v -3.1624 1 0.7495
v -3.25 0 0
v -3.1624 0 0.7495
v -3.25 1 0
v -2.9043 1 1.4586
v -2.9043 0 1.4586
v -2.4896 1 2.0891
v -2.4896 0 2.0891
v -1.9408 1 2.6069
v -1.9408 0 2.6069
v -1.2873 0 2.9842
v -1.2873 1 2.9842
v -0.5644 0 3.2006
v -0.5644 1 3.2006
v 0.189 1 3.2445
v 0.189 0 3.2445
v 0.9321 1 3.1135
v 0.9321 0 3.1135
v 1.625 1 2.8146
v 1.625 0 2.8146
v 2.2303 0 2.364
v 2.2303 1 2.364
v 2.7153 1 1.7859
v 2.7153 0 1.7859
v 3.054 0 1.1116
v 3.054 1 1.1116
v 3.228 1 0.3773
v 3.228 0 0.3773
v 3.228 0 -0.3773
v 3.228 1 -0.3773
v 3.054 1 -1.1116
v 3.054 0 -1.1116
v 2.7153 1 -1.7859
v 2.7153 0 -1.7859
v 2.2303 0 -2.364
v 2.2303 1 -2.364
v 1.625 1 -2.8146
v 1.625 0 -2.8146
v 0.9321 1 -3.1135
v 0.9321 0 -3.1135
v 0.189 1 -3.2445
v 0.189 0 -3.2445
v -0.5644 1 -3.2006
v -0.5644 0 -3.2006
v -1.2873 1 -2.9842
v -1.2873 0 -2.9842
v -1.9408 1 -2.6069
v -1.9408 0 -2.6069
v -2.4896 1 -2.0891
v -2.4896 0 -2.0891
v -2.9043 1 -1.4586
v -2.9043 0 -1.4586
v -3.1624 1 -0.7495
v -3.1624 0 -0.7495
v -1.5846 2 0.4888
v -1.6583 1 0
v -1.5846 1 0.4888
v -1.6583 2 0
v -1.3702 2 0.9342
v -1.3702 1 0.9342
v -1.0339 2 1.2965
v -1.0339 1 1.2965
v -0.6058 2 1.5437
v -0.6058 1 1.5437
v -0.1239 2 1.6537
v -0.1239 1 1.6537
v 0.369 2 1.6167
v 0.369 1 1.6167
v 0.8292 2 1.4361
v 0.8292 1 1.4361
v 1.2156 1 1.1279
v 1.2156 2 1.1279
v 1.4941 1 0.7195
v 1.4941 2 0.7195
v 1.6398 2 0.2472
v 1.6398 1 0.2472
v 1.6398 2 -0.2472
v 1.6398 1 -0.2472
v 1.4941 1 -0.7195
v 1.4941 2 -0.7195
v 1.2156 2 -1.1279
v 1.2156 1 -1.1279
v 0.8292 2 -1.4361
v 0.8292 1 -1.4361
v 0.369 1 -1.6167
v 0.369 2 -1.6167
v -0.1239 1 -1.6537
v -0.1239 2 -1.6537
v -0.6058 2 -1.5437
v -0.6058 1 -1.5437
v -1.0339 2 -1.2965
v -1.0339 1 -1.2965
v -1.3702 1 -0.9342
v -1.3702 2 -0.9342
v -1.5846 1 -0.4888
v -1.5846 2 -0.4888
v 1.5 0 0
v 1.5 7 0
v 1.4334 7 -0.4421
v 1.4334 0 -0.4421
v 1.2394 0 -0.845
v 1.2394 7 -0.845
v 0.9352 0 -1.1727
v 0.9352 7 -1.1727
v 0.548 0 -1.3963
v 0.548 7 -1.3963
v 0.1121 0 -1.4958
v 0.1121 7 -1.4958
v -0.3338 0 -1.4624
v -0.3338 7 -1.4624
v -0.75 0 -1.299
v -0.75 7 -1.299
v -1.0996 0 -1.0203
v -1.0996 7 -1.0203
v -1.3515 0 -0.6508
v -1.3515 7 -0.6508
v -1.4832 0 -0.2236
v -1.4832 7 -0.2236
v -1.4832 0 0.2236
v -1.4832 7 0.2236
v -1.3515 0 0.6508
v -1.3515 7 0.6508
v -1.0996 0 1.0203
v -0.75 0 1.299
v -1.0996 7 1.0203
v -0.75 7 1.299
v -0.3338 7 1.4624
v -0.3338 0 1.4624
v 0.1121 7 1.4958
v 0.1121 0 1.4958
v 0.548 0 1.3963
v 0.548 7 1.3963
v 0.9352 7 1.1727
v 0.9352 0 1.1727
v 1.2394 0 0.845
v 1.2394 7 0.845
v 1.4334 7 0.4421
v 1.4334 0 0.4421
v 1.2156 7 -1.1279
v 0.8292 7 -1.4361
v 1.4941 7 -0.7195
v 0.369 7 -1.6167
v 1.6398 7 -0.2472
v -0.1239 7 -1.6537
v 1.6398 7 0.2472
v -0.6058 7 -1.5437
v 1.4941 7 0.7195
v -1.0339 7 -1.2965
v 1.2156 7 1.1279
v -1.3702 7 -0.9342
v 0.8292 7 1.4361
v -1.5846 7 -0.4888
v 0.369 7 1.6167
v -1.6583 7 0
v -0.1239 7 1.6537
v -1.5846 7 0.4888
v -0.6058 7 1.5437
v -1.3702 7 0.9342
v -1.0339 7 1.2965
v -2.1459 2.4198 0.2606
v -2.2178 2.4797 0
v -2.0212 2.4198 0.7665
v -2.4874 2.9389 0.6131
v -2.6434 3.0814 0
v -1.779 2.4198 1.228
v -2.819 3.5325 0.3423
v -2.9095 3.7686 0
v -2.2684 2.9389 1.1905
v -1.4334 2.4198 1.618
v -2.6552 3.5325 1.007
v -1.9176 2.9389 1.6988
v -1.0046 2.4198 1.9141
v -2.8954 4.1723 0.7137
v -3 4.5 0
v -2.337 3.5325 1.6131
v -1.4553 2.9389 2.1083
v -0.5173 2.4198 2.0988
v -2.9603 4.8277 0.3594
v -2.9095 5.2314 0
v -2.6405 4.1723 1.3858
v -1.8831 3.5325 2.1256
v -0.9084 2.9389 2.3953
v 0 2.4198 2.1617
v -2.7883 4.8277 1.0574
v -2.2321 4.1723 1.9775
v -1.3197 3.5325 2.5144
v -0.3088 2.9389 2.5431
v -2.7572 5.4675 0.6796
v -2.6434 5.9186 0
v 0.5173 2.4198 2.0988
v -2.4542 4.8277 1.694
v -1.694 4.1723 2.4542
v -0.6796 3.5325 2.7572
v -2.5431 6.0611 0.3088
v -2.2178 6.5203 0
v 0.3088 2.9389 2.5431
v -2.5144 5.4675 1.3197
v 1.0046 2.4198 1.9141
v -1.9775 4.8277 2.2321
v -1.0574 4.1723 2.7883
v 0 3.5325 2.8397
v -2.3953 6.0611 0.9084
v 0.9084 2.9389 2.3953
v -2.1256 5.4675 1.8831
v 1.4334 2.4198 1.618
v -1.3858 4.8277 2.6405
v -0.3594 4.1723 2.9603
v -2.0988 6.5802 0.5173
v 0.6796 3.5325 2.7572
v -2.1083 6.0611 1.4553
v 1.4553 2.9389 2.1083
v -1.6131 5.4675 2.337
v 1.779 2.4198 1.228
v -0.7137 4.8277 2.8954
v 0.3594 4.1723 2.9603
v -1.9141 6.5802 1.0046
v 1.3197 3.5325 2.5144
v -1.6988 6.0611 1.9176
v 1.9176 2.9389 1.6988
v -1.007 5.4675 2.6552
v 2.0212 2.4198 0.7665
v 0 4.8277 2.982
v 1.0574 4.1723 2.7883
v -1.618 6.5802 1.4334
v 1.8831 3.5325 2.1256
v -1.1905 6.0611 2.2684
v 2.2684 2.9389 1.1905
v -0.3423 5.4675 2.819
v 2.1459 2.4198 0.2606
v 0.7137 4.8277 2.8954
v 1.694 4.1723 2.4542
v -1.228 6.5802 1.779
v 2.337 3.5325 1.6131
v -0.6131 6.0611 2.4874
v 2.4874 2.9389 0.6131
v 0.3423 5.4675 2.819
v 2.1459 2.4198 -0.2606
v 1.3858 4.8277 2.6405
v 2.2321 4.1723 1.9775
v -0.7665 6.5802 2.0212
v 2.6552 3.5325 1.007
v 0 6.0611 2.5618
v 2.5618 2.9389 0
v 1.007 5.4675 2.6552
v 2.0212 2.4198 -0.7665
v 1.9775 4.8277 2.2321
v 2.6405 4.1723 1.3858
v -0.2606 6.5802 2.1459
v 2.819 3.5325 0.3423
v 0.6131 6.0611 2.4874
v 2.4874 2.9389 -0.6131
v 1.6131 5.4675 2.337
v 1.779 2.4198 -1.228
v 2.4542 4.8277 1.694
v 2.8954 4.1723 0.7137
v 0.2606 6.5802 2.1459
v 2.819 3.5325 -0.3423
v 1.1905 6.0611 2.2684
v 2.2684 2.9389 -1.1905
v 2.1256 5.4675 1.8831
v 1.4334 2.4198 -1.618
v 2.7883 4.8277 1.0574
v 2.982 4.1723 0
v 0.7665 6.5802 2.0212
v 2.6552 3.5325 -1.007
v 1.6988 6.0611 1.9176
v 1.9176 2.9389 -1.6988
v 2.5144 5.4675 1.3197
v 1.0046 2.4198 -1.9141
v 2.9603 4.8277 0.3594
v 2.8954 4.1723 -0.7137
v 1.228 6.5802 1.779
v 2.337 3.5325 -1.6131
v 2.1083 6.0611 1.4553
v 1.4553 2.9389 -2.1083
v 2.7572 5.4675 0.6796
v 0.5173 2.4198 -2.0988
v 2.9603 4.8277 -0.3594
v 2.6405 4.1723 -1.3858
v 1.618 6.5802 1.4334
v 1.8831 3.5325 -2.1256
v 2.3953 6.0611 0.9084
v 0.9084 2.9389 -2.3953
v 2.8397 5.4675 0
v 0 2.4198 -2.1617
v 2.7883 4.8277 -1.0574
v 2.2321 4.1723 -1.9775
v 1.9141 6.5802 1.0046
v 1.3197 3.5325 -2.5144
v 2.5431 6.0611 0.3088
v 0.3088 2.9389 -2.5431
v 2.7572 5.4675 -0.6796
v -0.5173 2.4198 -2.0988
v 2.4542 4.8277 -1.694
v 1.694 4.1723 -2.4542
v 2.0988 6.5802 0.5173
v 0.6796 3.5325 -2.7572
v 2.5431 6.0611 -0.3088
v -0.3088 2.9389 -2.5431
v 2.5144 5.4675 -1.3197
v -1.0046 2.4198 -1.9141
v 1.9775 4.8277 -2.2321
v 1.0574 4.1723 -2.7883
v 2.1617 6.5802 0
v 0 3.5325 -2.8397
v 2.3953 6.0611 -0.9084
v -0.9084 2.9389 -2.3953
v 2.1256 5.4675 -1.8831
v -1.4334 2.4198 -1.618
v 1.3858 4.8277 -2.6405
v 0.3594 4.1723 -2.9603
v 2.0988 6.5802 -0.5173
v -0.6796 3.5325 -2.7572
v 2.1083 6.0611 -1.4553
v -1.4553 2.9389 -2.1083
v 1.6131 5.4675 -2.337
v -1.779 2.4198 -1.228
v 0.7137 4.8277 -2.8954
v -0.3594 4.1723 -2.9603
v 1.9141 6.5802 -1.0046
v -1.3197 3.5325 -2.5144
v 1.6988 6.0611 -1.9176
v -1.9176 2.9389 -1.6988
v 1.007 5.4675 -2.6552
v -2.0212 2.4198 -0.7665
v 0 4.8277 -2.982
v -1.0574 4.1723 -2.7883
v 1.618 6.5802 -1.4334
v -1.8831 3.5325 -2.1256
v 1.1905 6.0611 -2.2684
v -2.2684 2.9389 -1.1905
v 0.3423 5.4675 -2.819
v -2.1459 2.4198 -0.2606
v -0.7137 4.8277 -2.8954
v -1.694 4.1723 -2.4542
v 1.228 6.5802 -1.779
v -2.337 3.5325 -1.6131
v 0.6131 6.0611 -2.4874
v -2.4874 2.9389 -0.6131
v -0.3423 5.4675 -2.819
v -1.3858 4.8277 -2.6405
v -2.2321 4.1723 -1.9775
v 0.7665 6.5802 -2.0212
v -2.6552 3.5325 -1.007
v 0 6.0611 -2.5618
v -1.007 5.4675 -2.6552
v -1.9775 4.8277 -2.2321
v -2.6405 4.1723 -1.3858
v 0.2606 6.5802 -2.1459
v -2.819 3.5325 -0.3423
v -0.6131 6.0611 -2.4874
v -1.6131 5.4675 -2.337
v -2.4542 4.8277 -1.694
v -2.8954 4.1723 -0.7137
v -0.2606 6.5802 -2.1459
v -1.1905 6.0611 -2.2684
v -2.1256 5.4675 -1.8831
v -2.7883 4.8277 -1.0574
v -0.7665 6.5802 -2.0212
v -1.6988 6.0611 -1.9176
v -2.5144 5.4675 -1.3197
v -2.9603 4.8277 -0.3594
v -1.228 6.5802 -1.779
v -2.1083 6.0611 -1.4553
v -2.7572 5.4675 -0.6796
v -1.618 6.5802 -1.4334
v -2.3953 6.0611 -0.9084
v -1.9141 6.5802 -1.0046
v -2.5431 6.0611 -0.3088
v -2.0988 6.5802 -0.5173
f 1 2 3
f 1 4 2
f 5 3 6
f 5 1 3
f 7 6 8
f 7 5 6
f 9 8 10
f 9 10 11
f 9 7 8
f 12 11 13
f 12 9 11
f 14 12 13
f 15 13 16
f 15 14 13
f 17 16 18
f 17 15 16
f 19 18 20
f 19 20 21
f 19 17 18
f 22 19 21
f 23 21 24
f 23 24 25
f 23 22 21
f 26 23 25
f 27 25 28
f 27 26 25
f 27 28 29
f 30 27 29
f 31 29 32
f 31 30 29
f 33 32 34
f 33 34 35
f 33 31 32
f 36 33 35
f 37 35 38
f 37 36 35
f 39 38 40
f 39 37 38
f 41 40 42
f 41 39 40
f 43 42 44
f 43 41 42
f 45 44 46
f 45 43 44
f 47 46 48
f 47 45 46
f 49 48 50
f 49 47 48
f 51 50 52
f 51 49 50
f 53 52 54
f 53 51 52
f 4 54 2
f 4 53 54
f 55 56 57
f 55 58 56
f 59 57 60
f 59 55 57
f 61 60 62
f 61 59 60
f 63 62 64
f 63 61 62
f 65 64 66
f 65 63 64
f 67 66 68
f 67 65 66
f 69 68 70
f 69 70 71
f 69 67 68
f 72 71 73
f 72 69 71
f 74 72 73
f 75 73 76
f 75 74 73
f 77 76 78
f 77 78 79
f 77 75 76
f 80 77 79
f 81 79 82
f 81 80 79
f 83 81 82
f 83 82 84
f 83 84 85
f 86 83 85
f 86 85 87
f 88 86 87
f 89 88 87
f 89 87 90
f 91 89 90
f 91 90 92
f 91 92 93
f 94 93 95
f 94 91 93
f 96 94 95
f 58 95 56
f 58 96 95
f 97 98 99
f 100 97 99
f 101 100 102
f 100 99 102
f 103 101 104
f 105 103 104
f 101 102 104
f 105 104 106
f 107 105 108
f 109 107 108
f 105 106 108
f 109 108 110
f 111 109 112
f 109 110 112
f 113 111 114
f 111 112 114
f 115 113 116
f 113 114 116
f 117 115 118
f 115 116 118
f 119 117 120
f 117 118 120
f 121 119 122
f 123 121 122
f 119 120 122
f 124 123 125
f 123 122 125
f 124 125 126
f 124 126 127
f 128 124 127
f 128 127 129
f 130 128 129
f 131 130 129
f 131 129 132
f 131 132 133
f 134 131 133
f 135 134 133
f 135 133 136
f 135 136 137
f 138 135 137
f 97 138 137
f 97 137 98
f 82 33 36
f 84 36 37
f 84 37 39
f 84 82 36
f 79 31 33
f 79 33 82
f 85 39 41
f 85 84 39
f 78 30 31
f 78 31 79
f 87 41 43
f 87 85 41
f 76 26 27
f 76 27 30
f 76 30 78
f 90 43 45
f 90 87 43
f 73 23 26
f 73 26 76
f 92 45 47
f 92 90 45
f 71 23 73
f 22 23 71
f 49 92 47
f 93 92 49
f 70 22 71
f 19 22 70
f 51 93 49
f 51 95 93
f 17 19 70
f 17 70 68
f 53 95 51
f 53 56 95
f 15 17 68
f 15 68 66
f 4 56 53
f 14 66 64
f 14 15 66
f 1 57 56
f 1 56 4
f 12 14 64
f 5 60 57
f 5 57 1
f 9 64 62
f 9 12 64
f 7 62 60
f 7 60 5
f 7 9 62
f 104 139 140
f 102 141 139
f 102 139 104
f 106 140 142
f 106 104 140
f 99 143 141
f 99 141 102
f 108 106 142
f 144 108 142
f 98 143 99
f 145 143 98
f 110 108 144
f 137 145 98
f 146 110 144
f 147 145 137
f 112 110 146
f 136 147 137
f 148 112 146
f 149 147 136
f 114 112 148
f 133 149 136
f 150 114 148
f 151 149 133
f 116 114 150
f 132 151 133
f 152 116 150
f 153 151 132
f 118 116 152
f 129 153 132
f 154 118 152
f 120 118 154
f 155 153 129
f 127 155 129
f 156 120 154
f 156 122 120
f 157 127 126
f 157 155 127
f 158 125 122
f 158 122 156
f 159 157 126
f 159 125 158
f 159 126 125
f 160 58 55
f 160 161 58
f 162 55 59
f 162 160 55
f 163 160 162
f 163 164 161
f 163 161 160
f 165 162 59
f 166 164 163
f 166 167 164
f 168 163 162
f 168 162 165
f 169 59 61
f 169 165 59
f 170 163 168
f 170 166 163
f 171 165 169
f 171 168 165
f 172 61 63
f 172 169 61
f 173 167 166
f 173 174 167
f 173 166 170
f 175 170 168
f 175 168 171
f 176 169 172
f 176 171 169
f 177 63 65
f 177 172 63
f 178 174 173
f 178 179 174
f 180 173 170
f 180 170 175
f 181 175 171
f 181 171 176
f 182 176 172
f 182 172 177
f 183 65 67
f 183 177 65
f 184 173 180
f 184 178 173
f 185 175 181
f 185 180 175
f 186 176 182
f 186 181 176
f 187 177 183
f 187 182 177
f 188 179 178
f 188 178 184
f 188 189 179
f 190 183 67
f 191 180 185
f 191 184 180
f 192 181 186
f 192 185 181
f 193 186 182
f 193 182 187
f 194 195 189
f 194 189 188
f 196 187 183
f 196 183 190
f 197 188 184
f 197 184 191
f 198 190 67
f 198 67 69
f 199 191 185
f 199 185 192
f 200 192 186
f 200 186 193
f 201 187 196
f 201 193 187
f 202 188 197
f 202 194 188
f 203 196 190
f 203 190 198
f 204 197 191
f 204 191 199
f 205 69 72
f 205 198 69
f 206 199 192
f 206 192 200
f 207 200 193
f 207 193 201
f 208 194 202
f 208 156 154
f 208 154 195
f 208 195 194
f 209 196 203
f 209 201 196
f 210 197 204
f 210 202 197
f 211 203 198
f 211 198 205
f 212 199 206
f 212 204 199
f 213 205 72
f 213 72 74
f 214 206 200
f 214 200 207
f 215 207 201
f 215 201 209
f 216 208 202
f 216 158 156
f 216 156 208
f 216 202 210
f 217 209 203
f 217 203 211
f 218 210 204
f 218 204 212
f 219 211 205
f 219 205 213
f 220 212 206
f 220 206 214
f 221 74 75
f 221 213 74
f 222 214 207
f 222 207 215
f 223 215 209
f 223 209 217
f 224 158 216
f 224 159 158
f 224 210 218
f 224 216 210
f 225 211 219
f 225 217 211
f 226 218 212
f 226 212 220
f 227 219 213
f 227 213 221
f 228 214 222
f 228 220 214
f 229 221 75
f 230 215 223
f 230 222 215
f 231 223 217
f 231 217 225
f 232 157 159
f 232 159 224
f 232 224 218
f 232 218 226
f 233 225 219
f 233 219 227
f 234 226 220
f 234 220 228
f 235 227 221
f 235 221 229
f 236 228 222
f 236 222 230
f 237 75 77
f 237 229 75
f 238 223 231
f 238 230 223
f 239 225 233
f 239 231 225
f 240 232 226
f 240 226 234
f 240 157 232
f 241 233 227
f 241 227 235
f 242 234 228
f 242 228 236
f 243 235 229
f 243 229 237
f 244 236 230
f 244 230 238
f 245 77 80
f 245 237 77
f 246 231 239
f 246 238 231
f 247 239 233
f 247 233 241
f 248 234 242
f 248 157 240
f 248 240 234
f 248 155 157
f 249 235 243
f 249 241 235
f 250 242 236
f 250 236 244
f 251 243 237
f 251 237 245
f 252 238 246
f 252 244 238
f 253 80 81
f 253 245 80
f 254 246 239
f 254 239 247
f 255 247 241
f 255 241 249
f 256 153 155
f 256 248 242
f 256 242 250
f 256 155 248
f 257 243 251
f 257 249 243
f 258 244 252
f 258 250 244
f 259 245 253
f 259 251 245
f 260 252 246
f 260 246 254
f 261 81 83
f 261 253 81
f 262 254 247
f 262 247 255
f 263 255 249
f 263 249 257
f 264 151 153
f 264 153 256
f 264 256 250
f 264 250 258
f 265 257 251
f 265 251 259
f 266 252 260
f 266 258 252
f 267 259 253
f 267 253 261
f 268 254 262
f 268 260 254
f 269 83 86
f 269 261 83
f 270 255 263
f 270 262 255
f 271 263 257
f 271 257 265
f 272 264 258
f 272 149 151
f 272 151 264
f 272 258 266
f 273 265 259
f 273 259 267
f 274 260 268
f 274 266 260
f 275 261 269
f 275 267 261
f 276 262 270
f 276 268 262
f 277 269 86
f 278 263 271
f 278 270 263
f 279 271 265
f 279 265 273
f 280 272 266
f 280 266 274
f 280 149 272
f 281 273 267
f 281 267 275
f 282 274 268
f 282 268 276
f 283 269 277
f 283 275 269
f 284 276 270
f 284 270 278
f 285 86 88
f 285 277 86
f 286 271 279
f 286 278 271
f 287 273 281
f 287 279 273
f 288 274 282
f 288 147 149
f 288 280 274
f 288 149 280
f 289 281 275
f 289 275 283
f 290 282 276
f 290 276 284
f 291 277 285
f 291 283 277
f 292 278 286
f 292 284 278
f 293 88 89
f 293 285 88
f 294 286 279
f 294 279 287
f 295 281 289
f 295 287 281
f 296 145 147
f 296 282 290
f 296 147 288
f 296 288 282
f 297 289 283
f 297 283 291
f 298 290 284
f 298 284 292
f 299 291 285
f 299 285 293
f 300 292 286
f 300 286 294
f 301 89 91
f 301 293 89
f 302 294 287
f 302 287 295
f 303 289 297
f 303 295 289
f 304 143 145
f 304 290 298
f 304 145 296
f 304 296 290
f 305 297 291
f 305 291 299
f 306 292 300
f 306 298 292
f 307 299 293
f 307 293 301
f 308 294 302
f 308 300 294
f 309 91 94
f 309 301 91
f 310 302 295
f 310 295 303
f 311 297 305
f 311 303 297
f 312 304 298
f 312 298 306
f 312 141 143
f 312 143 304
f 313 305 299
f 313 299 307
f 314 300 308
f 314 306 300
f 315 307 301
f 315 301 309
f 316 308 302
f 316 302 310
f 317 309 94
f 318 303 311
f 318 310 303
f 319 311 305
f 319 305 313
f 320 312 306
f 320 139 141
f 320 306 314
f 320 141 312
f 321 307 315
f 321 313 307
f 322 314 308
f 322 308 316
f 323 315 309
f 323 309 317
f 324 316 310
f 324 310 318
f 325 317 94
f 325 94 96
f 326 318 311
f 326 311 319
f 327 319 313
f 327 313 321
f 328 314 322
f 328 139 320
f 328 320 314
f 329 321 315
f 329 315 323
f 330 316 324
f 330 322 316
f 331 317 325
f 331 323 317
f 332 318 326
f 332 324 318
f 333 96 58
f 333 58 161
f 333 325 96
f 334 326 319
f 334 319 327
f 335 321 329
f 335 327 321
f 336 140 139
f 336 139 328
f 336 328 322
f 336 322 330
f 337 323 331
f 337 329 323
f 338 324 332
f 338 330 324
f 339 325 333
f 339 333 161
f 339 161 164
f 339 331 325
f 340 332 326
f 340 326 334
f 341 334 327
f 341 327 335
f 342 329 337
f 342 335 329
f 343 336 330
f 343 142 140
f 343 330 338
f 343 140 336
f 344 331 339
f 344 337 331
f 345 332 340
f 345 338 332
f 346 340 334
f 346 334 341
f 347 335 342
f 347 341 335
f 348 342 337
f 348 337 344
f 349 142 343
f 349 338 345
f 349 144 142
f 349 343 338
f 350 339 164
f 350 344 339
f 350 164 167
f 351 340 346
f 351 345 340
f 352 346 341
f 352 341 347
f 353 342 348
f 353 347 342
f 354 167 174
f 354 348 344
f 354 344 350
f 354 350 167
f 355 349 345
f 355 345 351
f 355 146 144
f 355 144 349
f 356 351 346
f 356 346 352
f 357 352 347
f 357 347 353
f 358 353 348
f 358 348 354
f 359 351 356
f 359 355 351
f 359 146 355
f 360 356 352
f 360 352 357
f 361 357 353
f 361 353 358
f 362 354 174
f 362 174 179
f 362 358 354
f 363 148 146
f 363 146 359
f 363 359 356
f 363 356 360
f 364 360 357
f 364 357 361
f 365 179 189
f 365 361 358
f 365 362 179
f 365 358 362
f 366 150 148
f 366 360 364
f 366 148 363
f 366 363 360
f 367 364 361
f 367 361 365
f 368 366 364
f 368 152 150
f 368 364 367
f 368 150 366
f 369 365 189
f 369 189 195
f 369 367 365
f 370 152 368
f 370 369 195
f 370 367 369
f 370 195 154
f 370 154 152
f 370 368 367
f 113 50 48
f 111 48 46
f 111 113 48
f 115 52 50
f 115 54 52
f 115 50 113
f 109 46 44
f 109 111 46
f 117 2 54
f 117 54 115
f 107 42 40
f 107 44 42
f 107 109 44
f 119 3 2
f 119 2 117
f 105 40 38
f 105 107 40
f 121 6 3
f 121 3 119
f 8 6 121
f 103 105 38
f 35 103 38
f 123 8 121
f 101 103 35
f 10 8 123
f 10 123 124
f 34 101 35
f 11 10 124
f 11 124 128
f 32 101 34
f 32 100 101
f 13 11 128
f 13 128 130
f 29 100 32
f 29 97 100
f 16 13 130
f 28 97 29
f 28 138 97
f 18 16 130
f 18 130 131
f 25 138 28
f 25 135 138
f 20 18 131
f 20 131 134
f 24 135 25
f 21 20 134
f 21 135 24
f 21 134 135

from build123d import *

# Parameters (mm, degrees)
SKETCH2_R          = 1.5
CUT_EXTRUDE1_DEPTH = 8


with BuildPart() as part:
    # Sketch1 → Revolve1 (revolve)
    with BuildSketch(Plane.XY):
        with BuildLine():
            Line((0, 0), (-3.25, 0))
            Line((-3.25, 0), (-3.25, 1))
            Line((-3.25, 1), (-1.658312395, 1))
            Line((-1.658312395, 1), (-1.658312395, 2))
            ThreePointArc((-1.658312395, 2), (-3, 4.5), (-1.658312395, 7))
            Line((-1.658312395, 7), (0, 7))
            Line((0, 7), (0, 0))
        make_face()
    revolve(axis=Axis((0, 0, 0), (0, 1, 0)))

    # Sketch2 → Cut-Extrude1 (cut, through all)
    with BuildSketch(Plane(origin=(0, 7, 0), x_dir=(1, 0, 0), z_dir=(0, 1, 0))):
        Circle(SKETCH2_R)
    extrude(amount=-CUT_EXTRUDE1_DEPTH, mode=Mode.SUBTRACT)


solid = part.part
